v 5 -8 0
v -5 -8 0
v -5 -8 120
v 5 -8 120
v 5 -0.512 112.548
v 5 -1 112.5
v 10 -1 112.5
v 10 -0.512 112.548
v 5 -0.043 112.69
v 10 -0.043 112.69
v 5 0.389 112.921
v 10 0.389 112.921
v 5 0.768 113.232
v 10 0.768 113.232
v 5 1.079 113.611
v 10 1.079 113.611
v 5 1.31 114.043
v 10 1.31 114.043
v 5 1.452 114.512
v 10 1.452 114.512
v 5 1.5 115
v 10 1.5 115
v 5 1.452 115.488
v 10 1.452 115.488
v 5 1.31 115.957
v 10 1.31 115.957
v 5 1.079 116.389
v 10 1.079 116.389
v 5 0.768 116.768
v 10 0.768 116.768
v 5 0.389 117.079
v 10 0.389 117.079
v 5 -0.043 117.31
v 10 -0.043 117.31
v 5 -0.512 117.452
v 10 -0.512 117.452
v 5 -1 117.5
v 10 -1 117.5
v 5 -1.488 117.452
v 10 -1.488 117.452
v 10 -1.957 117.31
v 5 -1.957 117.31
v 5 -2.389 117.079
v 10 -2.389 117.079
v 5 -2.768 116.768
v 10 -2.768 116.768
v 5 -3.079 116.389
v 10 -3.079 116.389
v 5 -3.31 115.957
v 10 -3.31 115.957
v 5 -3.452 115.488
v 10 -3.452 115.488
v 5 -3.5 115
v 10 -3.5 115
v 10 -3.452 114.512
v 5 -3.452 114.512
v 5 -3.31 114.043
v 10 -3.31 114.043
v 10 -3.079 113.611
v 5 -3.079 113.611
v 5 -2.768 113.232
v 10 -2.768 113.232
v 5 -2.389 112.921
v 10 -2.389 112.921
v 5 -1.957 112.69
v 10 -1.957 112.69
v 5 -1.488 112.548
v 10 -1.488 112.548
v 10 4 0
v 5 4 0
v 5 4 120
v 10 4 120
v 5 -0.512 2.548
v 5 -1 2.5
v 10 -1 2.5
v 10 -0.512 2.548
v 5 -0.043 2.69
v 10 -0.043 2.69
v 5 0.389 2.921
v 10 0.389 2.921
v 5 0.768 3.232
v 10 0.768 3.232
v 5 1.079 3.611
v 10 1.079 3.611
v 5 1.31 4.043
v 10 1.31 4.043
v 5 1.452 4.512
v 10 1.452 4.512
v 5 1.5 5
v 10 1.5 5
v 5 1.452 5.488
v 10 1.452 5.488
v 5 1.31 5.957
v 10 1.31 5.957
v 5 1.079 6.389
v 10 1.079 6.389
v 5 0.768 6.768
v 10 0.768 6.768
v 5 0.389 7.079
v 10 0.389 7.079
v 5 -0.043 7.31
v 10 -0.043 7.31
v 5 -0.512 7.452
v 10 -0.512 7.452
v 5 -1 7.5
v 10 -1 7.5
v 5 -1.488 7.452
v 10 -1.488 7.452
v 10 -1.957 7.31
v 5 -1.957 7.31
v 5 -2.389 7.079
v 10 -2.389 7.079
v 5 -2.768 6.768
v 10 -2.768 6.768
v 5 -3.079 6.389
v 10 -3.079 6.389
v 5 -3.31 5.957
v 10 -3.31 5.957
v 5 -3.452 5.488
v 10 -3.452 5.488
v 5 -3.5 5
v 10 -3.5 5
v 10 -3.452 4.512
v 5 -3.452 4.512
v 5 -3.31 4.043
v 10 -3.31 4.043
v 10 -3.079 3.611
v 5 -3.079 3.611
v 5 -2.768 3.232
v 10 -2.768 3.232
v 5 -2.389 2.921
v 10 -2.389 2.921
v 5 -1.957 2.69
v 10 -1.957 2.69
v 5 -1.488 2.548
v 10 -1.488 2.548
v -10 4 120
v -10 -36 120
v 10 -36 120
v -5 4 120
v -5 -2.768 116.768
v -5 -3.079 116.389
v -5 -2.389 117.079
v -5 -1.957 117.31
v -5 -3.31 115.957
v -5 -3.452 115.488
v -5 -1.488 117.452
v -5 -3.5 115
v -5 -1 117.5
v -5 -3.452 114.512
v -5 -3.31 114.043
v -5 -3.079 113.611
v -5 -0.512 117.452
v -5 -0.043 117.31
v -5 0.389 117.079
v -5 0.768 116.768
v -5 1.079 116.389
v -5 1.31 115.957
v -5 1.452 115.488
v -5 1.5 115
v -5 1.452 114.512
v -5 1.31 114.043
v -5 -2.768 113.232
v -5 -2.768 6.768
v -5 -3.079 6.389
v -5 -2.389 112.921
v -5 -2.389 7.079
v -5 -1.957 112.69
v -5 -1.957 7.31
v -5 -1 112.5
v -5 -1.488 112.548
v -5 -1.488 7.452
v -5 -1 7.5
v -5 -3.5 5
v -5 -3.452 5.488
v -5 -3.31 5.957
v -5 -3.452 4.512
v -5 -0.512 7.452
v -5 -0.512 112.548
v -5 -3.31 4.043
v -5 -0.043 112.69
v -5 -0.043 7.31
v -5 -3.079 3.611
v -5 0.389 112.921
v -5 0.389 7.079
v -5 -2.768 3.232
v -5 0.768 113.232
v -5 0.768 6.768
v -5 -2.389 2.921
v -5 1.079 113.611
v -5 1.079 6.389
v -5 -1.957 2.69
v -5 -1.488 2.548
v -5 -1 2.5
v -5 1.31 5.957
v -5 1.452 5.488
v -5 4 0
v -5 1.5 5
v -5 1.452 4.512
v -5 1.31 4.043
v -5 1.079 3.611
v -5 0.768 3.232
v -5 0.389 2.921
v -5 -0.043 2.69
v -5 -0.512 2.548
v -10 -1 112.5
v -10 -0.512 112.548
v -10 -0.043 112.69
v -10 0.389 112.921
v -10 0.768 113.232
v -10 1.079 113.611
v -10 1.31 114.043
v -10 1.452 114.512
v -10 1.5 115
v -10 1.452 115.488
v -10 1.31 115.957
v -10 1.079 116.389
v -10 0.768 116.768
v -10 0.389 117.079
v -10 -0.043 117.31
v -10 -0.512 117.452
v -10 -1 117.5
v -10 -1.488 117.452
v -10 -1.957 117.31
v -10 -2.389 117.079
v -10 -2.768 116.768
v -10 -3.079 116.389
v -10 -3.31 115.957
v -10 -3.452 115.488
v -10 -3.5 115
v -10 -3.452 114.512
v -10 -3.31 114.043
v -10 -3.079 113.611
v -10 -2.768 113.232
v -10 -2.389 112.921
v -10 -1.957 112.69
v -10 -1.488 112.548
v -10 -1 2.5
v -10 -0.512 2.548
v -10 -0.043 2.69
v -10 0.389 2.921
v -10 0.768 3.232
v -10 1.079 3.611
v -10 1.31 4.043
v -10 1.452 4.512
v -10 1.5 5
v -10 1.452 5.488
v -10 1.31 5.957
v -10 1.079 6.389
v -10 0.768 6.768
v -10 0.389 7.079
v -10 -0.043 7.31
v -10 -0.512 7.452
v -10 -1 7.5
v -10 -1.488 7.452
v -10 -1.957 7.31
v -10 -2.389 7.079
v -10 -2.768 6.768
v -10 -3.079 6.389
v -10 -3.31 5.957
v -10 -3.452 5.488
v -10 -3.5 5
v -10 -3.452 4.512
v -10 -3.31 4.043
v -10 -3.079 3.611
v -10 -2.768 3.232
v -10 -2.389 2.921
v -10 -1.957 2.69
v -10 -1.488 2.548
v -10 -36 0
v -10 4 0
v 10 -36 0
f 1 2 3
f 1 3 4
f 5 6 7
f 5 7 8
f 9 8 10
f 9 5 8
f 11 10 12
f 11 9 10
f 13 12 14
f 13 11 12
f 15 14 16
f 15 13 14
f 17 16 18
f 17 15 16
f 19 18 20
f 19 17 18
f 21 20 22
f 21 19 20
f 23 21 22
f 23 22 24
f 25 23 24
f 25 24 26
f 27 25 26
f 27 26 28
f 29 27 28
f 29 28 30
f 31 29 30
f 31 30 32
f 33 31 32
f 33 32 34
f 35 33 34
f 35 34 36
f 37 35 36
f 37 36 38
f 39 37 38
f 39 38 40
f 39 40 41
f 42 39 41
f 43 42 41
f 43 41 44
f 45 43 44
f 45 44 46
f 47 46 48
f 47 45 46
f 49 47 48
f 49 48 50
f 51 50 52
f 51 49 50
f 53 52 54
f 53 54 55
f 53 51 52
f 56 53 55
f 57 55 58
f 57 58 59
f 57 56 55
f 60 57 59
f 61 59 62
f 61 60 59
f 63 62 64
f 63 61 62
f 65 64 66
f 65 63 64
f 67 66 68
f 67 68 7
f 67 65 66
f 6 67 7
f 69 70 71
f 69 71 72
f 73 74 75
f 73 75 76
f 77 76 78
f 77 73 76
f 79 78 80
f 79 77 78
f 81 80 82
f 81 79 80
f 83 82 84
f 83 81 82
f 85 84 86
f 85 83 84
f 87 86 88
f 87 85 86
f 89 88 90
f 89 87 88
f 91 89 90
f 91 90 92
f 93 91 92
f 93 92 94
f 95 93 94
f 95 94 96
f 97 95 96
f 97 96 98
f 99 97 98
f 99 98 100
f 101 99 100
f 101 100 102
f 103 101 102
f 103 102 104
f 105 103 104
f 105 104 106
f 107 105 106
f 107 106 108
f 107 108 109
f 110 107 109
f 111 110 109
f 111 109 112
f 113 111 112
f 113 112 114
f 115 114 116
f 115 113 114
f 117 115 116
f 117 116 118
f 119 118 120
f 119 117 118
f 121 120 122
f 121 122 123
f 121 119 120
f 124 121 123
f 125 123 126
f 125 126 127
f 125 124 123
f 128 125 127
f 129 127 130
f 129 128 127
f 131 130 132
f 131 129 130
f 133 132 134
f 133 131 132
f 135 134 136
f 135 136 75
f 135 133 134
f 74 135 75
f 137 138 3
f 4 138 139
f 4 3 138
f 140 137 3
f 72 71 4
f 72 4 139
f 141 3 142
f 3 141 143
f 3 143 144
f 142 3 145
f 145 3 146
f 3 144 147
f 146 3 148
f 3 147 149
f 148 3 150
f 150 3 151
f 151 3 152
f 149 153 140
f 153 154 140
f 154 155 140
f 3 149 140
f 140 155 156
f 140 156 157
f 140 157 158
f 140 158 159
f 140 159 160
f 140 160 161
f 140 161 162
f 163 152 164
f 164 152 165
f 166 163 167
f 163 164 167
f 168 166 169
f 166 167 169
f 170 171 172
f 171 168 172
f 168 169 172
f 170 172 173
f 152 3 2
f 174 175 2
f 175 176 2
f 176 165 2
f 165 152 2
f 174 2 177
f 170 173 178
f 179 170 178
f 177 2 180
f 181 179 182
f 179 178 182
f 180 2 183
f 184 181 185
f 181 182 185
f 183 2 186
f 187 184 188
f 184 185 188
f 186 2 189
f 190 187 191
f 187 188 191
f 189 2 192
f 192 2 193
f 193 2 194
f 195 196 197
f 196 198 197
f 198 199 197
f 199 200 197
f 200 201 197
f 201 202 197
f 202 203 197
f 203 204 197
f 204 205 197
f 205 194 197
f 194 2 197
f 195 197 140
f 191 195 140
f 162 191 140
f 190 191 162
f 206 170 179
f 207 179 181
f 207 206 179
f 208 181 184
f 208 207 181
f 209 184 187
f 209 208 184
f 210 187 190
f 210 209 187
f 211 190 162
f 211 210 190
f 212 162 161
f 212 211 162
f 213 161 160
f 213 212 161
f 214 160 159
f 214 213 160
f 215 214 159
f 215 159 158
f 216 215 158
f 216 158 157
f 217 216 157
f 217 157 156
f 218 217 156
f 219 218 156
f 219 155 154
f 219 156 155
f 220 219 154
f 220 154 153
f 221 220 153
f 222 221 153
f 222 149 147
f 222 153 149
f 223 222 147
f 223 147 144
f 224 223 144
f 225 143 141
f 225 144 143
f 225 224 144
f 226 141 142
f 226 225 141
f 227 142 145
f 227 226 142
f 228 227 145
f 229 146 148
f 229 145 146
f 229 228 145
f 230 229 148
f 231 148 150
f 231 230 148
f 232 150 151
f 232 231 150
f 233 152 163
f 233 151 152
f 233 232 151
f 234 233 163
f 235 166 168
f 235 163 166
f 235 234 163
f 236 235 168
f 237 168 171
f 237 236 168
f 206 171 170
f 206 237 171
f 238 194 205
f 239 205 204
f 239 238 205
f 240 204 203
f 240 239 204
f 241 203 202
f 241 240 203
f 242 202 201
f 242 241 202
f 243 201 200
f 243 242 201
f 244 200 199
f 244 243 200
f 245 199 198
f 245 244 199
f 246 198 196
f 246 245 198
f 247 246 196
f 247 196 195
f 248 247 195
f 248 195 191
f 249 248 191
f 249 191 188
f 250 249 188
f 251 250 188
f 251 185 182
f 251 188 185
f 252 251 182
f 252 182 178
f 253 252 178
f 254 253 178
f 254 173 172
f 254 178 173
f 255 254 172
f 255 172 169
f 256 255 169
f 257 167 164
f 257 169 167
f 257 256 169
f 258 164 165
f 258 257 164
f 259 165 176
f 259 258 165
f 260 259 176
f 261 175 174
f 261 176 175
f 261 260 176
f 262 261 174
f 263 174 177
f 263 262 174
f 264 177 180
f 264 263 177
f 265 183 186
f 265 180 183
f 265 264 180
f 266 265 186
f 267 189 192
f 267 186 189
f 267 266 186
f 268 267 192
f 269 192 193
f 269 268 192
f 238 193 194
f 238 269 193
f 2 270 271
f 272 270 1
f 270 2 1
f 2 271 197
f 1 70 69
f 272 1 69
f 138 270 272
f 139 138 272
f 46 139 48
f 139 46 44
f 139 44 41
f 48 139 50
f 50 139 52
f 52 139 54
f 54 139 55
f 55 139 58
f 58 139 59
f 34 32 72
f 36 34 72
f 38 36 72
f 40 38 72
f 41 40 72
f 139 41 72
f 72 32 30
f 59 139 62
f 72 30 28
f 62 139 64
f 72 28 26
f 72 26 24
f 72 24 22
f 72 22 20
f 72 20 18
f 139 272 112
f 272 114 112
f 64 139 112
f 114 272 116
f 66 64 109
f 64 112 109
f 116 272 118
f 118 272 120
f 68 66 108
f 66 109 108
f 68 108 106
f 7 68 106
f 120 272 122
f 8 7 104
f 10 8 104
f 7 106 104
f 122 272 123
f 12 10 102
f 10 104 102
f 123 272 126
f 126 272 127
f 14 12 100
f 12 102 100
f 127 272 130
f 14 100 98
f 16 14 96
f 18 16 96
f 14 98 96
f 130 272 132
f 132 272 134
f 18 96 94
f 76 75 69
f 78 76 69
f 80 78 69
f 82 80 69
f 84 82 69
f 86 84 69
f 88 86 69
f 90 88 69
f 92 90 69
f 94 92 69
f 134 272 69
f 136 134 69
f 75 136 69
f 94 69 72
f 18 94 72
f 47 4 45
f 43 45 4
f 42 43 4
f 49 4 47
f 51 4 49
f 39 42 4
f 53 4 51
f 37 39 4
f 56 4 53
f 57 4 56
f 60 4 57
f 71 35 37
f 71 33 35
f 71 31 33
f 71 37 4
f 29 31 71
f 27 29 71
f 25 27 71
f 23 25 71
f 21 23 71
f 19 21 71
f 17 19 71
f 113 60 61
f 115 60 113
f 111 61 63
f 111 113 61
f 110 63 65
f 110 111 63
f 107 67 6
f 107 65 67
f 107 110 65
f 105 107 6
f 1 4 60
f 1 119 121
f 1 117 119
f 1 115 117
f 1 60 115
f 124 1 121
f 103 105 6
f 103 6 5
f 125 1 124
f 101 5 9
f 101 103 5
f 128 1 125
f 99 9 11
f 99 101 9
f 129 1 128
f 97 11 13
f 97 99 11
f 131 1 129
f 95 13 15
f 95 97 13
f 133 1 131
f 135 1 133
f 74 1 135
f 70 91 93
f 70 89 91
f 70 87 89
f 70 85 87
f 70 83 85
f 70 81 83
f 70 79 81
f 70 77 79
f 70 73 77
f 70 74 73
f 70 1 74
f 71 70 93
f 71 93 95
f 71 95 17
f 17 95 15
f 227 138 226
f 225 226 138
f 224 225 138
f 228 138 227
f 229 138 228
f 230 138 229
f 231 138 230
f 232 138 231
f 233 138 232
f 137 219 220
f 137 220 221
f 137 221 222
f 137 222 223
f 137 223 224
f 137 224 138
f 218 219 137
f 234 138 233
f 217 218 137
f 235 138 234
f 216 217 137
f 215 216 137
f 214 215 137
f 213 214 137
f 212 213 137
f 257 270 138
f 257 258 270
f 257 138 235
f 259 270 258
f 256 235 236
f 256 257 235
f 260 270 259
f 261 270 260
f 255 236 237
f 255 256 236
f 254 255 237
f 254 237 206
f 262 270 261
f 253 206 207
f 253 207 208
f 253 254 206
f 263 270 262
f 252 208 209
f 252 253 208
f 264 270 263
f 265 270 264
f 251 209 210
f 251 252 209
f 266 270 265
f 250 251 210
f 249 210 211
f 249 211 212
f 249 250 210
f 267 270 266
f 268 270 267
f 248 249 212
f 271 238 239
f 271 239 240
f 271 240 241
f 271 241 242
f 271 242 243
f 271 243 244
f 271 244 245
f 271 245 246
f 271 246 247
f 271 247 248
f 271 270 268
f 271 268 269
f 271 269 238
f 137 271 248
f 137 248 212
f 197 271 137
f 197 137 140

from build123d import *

# Parameters (mm, degrees)
CYLINDER040_R     = 2.5
CYLINDER040_DEPTH = 20
CYLINDER039_R     = 2.5
CYLINDER039_DEPTH = 20
BOX012_W          = 10
BOX012_H          = 12
BOX012_DEPTH      = 120
BOX013_W          = 20
BOX013_H          = 40
BOX013_DEPTH      = 120


with BuildPart() as cilindro027:
    # Cylinder040 → Cylinder040 (new body)
    with BuildSketch(Plane(origin=(-10, 59, 115), x_dir=(0, 0, -1), z_dir=(1, 0, 0))):
        Circle(CYLINDER040_R)
    extrude(amount=CYLINDER040_DEPTH)


with BuildPart() as uamarebridas:
    # Cylinder039 → Cylinder039 (new body)
    with BuildSketch(Plane(origin=(-10, 59, 5), x_dir=(0, 0, -1), z_dir=(1, 0, 0))):
        Circle(CYLINDER039_R)
    extrude(amount=CYLINDER039_DEPTH)

    # Fusion021: union Cilindro027
    add(cilindro027.part)


with BuildPart() as uamarebridas_1:
    # Fusion021 placement: moved
    add(uamarebridas.part.moved(Location((0, -60, 0))))


with BuildPart() as cubo012:
    # Box012 → Box012 (new body)
    with BuildSketch(Plane(origin=(-5, -72, 0), x_dir=(1, 0, 0), z_dir=(0, 0, 1))):
        with Locations((5, 6)):
            Rectangle(BOX012_W, BOX012_H)
    extrude(amount=BOX012_DEPTH)


with BuildPart() as cut037:
    # Box013 → Box013 (new body)
    with BuildSketch(Plane(origin=(-10, -100, 0), x_dir=(1, 0, 0), z_dir=(0, 0, 1))):
        with Locations((10, 20)):
            Rectangle(BOX013_W, BOX013_H)
    extrude(amount=BOX013_DEPTH)

    # Cut036: cut Cubo012
    add(cubo012.part, mode=Mode.SUBTRACT)


with BuildPart() as cut037_1:
    # Cut036 placement: moved
    add(cut037.part.moved(Location((0, 64, 0))))

    # Cut037: cut UamareBridas
    add(uamarebridas_1.part, mode=Mode.SUBTRACT)


solid = cut037_1.part
